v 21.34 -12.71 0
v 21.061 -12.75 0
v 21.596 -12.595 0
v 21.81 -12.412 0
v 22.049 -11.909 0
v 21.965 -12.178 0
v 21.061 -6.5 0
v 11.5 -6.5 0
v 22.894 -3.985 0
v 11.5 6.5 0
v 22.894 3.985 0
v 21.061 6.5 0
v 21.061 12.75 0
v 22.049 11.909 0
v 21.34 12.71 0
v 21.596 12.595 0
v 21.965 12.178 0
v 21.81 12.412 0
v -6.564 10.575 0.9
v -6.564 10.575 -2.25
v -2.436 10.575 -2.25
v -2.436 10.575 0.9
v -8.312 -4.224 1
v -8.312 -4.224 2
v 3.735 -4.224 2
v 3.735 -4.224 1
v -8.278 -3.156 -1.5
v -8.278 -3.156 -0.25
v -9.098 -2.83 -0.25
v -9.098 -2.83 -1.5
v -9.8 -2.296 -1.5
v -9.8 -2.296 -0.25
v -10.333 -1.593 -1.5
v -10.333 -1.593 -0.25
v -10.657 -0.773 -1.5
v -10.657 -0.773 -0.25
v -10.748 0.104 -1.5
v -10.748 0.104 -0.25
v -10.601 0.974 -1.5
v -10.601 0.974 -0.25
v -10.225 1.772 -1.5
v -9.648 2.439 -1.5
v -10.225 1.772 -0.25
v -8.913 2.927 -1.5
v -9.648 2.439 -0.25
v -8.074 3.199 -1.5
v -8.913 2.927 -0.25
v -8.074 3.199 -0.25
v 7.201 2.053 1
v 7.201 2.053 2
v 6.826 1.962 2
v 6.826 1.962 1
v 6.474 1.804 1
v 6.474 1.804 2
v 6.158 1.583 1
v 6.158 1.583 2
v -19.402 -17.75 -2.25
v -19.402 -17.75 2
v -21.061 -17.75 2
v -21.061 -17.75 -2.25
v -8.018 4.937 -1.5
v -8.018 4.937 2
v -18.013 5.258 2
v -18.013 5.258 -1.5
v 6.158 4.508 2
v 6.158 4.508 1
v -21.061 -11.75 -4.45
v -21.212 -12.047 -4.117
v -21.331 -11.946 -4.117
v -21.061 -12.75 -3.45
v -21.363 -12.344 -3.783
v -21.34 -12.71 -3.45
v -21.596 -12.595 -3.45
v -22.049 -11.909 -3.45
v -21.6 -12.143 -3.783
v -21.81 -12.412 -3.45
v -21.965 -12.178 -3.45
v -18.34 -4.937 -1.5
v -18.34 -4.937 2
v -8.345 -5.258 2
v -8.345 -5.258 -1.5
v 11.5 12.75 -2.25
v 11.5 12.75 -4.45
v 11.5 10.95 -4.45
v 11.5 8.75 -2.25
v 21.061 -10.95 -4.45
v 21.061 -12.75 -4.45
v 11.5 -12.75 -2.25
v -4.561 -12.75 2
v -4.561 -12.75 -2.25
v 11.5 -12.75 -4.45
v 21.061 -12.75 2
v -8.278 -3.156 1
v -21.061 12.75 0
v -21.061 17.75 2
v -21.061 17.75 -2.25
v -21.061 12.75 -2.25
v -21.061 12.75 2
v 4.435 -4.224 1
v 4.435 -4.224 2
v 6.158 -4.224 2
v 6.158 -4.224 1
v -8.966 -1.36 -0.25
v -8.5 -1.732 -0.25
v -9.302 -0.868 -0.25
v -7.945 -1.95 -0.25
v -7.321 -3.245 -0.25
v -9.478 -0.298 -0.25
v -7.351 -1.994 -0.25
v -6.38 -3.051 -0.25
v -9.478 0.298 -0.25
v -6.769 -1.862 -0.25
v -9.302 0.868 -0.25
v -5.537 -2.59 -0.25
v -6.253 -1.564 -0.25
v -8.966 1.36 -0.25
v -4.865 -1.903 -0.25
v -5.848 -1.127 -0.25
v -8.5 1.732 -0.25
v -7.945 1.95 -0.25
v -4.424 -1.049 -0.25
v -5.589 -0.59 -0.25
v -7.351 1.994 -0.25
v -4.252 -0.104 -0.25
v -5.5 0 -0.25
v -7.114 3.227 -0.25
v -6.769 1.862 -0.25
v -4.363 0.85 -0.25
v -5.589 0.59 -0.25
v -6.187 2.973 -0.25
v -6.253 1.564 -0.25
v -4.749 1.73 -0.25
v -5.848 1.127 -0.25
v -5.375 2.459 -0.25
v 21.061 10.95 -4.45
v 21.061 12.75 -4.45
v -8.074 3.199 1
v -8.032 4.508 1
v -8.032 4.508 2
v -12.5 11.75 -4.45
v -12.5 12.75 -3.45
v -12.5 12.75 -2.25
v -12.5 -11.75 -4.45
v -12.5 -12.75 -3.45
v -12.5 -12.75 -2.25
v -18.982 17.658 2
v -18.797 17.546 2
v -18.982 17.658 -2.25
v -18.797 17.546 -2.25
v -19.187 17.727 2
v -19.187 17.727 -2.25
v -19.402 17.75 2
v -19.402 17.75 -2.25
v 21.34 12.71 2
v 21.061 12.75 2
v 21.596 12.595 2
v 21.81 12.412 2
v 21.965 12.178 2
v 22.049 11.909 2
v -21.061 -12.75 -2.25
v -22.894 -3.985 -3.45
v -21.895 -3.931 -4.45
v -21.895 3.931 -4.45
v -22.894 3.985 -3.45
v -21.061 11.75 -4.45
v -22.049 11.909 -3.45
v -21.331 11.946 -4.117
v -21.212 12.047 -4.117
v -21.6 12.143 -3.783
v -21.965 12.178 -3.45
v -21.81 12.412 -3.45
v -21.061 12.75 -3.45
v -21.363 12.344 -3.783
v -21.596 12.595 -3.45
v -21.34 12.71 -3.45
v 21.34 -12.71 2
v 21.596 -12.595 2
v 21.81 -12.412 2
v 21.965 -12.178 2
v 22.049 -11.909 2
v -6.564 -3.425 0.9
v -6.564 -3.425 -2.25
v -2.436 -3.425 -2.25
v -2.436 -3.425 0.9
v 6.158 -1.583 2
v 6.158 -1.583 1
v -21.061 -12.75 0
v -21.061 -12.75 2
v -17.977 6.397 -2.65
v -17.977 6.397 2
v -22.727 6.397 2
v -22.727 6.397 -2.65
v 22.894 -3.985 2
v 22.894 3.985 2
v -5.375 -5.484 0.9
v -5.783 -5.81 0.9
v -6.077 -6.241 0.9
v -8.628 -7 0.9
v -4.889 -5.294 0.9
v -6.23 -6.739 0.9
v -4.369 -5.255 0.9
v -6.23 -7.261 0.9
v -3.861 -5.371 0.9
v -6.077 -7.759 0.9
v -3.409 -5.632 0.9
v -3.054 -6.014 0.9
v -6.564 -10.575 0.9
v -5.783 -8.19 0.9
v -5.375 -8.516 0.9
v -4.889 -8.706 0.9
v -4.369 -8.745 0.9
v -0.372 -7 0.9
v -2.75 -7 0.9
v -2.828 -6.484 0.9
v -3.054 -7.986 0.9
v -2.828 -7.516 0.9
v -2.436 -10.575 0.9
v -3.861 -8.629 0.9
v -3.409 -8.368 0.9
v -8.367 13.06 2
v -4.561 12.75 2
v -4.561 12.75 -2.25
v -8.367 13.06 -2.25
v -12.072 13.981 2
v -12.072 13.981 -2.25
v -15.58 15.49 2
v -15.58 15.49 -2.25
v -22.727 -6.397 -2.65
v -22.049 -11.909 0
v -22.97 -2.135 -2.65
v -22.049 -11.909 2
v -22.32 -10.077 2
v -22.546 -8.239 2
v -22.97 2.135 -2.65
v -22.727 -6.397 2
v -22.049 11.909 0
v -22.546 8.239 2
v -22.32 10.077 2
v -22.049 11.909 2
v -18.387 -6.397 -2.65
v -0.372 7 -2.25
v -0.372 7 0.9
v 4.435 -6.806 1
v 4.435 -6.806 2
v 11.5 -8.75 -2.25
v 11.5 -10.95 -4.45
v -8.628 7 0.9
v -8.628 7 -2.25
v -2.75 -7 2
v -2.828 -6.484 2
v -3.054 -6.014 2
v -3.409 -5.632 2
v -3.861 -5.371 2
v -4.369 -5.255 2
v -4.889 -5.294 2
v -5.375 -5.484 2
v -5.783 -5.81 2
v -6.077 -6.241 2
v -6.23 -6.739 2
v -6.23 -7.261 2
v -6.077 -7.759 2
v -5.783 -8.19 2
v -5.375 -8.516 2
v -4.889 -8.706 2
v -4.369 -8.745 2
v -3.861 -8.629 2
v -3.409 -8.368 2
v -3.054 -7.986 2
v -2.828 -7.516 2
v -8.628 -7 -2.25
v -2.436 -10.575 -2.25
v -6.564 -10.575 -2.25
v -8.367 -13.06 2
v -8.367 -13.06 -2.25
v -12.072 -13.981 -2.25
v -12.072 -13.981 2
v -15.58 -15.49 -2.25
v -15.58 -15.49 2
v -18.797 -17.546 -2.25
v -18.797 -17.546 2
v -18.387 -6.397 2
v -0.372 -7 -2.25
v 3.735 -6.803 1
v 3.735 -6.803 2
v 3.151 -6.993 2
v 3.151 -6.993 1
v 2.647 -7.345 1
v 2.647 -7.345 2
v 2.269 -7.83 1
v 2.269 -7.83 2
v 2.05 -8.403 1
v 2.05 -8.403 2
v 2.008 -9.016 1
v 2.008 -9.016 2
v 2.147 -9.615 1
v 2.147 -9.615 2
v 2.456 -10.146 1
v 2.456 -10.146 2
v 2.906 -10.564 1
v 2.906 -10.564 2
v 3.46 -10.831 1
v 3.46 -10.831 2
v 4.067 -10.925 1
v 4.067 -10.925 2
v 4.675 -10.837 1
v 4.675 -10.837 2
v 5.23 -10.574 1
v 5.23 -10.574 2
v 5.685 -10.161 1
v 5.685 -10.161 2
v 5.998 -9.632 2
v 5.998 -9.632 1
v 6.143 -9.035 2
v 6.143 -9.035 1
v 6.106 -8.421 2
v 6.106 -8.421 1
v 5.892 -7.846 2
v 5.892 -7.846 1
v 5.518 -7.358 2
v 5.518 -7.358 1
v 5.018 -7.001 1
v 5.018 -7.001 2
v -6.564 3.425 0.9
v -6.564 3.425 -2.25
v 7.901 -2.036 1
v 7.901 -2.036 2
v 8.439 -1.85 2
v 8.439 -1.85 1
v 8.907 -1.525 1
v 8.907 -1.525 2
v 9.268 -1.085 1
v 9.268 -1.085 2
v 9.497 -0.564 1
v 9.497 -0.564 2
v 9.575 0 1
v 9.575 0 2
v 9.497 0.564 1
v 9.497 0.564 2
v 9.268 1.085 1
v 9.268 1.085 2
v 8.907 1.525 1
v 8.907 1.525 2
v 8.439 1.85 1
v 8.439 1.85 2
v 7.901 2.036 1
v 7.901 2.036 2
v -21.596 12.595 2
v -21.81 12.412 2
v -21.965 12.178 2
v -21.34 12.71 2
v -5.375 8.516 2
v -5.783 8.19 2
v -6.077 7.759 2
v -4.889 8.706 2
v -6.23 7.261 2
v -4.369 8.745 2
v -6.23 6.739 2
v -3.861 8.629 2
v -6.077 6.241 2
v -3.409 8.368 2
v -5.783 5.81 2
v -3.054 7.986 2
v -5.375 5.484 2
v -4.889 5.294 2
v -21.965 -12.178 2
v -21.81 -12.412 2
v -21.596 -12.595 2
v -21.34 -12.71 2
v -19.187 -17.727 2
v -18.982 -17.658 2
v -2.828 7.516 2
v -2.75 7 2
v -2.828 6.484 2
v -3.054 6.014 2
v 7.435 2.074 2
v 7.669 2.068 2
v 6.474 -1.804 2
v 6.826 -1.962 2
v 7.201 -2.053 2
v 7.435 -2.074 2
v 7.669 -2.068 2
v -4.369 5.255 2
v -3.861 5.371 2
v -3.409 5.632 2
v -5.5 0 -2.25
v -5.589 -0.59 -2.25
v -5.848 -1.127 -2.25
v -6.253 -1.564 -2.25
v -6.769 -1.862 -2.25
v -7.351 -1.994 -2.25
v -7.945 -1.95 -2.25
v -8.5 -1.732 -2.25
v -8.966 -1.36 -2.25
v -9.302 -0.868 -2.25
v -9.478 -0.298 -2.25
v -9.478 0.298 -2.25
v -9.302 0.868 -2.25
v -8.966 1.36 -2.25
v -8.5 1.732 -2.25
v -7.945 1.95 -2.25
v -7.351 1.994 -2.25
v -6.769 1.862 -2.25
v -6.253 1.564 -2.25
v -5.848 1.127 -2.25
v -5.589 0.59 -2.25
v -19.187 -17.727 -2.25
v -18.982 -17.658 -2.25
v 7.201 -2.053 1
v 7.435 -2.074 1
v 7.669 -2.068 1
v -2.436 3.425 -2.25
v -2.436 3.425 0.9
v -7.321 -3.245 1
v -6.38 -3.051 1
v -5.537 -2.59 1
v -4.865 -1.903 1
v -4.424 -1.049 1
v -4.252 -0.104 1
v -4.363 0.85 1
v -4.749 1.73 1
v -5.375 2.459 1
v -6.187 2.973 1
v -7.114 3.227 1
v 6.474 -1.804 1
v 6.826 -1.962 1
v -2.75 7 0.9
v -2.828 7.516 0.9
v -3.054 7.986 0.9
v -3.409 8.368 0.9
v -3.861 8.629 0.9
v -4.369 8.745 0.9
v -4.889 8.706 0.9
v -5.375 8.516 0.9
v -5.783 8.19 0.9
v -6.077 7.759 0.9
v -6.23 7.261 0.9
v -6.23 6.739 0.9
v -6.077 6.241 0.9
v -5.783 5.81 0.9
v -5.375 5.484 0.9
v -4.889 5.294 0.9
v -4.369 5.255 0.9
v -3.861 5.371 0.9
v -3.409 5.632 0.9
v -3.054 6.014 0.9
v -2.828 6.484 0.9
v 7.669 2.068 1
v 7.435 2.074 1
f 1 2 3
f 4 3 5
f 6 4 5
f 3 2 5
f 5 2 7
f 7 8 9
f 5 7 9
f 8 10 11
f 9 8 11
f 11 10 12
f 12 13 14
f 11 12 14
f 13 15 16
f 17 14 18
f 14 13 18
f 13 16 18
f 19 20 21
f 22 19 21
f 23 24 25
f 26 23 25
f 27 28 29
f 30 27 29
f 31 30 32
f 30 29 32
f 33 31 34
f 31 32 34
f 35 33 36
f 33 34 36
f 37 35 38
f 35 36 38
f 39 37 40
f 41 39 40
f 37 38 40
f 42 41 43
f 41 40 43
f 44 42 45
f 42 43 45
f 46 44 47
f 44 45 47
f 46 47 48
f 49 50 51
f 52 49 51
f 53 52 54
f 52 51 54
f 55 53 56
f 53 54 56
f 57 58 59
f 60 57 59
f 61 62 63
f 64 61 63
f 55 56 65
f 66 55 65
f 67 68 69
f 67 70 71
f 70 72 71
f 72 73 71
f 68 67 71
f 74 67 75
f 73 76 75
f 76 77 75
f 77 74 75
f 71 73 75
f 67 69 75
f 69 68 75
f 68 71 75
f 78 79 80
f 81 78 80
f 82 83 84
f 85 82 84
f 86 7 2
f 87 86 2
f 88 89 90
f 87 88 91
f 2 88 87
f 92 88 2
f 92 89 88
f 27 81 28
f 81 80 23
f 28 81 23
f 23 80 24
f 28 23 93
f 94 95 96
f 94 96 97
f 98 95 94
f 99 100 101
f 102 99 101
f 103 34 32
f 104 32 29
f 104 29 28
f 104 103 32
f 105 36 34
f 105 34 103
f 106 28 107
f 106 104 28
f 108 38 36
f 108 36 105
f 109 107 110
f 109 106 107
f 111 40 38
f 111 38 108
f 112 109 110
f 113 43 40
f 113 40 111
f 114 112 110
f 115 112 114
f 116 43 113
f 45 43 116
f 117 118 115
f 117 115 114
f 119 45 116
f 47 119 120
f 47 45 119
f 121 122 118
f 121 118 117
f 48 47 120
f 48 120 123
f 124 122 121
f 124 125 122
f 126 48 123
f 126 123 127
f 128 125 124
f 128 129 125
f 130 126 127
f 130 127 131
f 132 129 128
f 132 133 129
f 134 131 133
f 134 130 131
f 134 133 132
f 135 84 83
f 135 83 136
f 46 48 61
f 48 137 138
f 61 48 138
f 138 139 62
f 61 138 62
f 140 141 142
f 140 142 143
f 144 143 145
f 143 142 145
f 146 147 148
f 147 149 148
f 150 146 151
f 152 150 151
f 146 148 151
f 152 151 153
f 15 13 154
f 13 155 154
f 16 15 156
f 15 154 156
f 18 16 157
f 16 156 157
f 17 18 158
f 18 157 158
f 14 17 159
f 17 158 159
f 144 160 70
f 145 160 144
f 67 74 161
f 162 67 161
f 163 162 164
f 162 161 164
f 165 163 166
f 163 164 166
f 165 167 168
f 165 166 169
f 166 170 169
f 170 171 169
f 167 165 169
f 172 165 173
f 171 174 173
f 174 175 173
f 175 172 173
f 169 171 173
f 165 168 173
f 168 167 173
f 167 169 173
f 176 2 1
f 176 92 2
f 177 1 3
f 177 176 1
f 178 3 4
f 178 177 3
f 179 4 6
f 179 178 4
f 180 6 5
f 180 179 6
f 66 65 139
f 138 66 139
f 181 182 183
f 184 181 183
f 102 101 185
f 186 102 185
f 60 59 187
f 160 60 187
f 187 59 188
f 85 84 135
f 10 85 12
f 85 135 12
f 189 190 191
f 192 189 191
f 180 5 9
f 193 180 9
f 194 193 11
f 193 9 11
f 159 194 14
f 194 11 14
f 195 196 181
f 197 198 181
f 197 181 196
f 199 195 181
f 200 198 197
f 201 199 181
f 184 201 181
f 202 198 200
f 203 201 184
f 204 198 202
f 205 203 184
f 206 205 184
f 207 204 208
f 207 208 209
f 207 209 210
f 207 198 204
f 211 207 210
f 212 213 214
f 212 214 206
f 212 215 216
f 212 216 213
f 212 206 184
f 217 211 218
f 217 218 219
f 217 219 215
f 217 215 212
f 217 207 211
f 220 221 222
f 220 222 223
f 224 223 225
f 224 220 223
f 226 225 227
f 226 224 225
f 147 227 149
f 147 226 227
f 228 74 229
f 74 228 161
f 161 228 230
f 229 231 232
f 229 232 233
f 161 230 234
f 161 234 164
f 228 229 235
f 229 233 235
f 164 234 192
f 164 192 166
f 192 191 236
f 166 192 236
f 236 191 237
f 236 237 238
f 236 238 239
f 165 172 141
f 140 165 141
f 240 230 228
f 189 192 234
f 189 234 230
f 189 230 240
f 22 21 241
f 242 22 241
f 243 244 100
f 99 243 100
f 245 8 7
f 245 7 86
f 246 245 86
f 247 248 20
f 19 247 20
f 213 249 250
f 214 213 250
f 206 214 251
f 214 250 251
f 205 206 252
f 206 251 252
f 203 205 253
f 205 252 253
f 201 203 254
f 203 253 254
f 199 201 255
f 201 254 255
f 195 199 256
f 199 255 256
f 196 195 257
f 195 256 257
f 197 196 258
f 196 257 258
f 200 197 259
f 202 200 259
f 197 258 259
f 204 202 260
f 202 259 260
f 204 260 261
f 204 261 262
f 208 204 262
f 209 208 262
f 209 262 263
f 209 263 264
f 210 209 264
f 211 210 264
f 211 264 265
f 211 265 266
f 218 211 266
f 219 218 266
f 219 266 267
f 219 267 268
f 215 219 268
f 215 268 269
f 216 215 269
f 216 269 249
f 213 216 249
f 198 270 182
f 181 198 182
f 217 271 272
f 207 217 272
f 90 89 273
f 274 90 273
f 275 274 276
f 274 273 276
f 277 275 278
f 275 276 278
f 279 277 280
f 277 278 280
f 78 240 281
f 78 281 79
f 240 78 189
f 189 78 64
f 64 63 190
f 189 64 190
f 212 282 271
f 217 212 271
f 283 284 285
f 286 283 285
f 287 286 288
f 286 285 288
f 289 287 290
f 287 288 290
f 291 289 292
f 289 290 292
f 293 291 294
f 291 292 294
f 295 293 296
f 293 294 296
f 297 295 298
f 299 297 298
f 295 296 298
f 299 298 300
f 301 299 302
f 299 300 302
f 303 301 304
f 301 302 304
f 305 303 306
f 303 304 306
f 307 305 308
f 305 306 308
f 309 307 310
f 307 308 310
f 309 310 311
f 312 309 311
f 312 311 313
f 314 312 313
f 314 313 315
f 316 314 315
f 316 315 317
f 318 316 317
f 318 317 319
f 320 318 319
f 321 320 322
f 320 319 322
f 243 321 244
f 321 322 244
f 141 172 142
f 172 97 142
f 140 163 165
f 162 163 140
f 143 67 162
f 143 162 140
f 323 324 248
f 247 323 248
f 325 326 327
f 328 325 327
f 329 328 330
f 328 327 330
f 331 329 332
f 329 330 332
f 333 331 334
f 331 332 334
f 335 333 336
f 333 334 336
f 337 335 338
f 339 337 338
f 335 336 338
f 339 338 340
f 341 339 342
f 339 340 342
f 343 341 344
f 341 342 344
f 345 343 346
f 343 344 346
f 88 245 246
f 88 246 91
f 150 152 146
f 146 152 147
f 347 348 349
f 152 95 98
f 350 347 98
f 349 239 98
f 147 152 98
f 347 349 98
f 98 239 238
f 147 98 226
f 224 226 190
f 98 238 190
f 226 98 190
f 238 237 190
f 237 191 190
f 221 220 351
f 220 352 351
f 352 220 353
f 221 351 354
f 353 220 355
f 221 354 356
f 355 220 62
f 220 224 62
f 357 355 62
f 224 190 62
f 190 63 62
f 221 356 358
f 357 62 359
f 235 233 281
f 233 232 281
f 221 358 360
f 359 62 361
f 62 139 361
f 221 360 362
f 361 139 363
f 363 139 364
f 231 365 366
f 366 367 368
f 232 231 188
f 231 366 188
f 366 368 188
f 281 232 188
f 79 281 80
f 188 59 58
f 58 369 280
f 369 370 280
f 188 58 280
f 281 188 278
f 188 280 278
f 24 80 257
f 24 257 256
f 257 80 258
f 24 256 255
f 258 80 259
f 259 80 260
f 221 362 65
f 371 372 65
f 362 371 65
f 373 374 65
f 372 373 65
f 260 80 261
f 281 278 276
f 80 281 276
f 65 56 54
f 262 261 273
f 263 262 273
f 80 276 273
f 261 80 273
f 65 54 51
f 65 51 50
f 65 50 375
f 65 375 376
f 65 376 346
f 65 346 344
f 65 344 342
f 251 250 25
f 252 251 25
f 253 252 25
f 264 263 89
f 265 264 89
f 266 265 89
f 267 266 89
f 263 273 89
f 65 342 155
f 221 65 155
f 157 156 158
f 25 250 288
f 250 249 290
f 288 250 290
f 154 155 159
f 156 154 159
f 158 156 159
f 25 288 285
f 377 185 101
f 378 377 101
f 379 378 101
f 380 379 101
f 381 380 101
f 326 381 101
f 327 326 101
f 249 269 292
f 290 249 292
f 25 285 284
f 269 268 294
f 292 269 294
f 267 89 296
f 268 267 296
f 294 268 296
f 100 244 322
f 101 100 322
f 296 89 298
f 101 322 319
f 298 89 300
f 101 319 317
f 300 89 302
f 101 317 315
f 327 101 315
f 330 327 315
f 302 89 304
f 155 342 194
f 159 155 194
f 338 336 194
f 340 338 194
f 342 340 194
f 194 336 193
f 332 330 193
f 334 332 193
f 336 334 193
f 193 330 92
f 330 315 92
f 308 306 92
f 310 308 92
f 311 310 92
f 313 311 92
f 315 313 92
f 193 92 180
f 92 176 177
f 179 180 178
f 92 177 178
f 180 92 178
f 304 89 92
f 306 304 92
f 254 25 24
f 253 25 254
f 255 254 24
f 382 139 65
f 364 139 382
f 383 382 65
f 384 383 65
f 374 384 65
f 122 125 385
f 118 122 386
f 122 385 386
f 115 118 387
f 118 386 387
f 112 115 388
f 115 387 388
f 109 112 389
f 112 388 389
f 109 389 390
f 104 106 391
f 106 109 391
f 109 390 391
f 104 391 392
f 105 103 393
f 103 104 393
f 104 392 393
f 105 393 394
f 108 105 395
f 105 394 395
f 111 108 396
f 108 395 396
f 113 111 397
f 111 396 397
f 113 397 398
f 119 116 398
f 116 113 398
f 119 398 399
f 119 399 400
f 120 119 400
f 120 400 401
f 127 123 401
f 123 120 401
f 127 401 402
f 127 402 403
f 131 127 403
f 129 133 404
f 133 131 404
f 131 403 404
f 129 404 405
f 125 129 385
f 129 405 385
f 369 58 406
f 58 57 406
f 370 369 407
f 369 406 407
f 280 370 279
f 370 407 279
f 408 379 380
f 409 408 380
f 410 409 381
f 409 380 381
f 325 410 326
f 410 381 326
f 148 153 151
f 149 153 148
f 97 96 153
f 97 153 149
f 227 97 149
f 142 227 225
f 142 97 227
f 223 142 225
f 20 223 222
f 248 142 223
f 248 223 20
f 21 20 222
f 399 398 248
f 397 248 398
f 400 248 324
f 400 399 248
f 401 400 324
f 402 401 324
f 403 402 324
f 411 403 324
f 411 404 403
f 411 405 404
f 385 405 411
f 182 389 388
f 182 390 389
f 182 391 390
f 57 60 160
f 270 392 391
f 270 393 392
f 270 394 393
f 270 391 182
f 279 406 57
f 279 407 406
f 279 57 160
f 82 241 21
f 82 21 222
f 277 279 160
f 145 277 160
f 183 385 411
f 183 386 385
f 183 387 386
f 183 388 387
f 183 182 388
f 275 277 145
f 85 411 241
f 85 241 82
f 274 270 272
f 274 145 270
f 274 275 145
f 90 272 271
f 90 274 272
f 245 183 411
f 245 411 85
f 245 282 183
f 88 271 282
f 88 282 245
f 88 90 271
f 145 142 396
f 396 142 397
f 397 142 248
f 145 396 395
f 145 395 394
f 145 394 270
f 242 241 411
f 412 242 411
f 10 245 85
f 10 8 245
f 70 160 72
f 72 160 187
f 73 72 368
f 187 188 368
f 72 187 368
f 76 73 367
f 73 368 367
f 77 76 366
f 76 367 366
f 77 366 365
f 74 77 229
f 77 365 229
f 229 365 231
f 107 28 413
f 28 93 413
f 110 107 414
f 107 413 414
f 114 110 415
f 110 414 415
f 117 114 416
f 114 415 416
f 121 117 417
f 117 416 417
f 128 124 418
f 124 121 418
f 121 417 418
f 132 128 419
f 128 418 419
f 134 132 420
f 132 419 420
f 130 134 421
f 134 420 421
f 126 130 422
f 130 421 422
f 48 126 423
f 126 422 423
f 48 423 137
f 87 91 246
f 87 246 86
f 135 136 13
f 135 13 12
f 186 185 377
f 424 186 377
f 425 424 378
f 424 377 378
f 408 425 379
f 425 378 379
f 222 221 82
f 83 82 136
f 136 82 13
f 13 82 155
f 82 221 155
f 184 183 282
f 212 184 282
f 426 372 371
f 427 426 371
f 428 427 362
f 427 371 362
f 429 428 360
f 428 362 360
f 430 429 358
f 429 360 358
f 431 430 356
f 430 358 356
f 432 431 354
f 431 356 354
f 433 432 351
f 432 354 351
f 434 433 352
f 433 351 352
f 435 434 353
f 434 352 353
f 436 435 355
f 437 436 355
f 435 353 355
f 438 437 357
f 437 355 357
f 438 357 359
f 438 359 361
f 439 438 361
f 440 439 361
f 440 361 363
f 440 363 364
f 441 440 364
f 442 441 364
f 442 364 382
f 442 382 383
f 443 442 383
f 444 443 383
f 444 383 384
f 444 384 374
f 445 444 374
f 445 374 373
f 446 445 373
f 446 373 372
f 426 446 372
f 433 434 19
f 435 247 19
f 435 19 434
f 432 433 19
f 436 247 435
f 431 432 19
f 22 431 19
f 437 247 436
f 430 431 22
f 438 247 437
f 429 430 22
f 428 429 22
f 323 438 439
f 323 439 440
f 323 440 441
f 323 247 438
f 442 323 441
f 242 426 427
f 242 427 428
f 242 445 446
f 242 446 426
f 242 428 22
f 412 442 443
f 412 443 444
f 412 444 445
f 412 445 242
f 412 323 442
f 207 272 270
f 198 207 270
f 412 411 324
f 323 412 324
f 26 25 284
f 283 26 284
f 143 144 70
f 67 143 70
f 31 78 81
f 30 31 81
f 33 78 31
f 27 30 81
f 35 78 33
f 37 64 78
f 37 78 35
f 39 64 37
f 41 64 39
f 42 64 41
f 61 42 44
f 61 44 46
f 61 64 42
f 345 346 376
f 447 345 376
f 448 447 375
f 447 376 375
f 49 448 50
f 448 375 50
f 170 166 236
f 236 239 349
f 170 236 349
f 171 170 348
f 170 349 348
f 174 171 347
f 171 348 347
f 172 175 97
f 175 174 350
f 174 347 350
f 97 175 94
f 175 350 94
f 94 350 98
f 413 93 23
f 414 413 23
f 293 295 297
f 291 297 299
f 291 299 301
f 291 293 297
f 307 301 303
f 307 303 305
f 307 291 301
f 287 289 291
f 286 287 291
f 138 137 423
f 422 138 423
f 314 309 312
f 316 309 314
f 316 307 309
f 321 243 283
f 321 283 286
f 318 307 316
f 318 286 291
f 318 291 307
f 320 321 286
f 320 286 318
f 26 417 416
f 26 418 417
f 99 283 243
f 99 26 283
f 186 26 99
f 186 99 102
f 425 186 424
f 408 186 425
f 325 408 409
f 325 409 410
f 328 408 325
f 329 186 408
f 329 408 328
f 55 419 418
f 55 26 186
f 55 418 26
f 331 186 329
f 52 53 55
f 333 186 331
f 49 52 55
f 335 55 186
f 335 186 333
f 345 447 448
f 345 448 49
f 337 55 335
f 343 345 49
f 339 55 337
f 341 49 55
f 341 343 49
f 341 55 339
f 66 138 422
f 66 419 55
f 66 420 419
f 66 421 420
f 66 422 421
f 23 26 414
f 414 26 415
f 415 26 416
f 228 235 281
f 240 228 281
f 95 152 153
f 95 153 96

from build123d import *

# Parameters (mm, degrees)
F1_DEPTH     = 2
F2_R         = 1
F4_DEPTH     = 2.25
F6_DEPTH     = 2.2
F7_R         = 2
F8_DEPTH     = 25
F9_R         = 3.25
F9_R_2       = 2
F10_DEPTH    = 2.25
F12_DEPTH    = 4.65
F14_DEPTH    = 3.5
F16_DEPTH    = 1
F17_R        = 1.75
F18_DEPTH    = 25
F20_DEPTH    = 3.15
F21_W        = 9.561190108
F21_H        = 6.25
F22_DEPTH    = 4.45
F23_T4_DEPTH = 21.0051794045
F23_T9_DEPTH = 21.0051794045
F24_SIZE     = 1
F26_DEPTH    = 4.25
F27_R        = 1


# Not quite as in the source:
# - a fillet or chamfer that OpenCascade refuses, or shapes differently, is made with other operations: its cross-section is extruded or revolved along the edge and cut away or added
# - a pattern or mirror of a feature is missing from the dataset's text; its kind, count and spacing are read off the source's solid


with BuildPart() as f1:
    # F0 (on Top) → F1 (new body)
    with BuildSketch(Plane.XY):
        with BuildLine():
            Line((21.9083046755, 12.75), (-21.9083046755, 12.75))
            ThreePointArc((-21.9083046755, 12.75), (-23, 0), (-21.9083046755, -12.75))
            Line((-21.9083046755, -12.75), (21.9083046755, -12.75))
            ThreePointArc((21.9083046755, -12.75), (23, 0), (21.9083046755, 12.75))
        make_face()
    extrude(amount=F1_DEPTH)

    # F2
    f2_edges = [f1.edges().sort_by_distance(p)[0] for p in [
        (-21.908305, 12.75, 1),
        (21.908305, 12.75, 1),
        (-21.908305, -12.75, 1),
        (21.908305, -12.75, 1),
    ]]
    fillet(f2_edges, radius=F2_R)

    # F3 (on face) → F4 (join)
    with BuildSketch(Plane(origin=(0, 0, 0), x_dir=(1, 0, 0), z_dir=(0, 0, -1))):
        with BuildLine():
            Line((11.5, 12.75), (-21.061190108, 12.75))
            ThreePointArc((-21.061190108, 12.75), (-21.7097331737, 12.5111779634), (-22.0485034879, 11.9087837838))
            ThreePointArc((-22.0485034879, 11.9087837838), (-23, 0), (-22.0485034879, -11.9087837838))
            ThreePointArc((-22.0485034879, -11.9087837838), (-21.7097331737, -12.5111779634), (-21.061190108, -12.75))
            Line((-21.061190108, -12.75), (11.5, -12.75))
            Line((11.5, -12.75), (11.5, 12.75))
        make_face()
    extrude(amount=F4_DEPTH)

    # F5 (on face) → F6 (join)
    with BuildSketch(Plane(origin=(0, 0, -2.25), x_dir=(1, 0, 0), z_dir=(0, 0, -1))):
        with BuildLine():
            ThreePointArc((-22.0485034879, -11.9087837838), (-21.7097331737, -12.5111779634), (-21.061190108, -12.75))
            Line((-21.061190108, -12.75), (-12.5, -12.75))
            Line((-12.5, -12.75), (-12.5, 12.75))
            Line((-12.5, 12.75), (-21.061190108, 12.75))
            ThreePointArc((-21.061190108, 12.75), (-21.7097331737, 12.5111779634), (-22.0485034879, 11.9087837838))
            ThreePointArc((-22.0485034879, 11.9087837838), (-23, 0), (-22.0485034879, -11.9087837838))
        make_face()
    extrude(amount=F6_DEPTH)

    # F7 (on face) → F8 (cut)
    with BuildSketch(Plane(origin=(0, 0, -2.25), x_dir=(1, 0, 0), z_dir=(0, 0, -1))):
        with Locations((-7.5, 0)):
            Circle(F7_R)
    extrude(amount=-F8_DEPTH, mode=Mode.SUBTRACT)

    # F9 (on face) → F10 (cut)
    with BuildSketch(Plane.XY.offset(2)):
        with Locations((-7.5, 0)):
            Circle(F9_R)
        with Locations((-7.5, 0)):
            Circle(F9_R_2, mode=Mode.SUBTRACT)
    extrude(amount=-F10_DEPTH, mode=Mode.SUBTRACT)

    # F11 (on face) → F12 (cut)
    with BuildSketch(Plane.XY.offset(2)):
        Polygon((-17.9767161827, 6.3967091968), (-22.7267161827, 6.3967091968), (-22.7267161827, -6.3967091968), (-18.3871376794, -6.3967091968), align=None)
        with BuildLine():
            ThreePointArc((-22.7267161827, -6.3967091968), (-23, 0), (-22.7267161827, 6.3967091968))
            Line((-22.7267161827, 6.3967091968), (-24.9030976, 6.3967091968))
            Line((-24.9030976, 6.3967091968), (-24.9030976, -6.3967091968))
            Line((-24.9030976, -6.3967091968), (-23.1371376794, -6.3967091968))
            Line((-23.1371376794, -6.3967091968), (-22.7267161827, -6.3967091968))
        make_face()
        Polygon((-22.7267161827, -6.3967091968), (-22.7267161827, 6.3967091968), (-24.9030976, 6.3967091968), (-24.9030976, -6.3967091968), (-23.1371376794, -6.3967091968), align=None)
    extrude(amount=-F12_DEPTH, mode=Mode.SUBTRACT)

    # F13 (on face) → F14 (cut)
    with BuildSketch(Plane.XY.offset(2)):
        with BuildLine():
            Line((-8.0183982933, 4.9370567441), (-18.0132564134, 5.2576985384))
            Line((-18.0132564134, 5.2576985384), (-18.3403110436, -4.9370567441))
            Line((-18.3403110436, -4.9370567441), (-8.3454529235, -5.2576985384))
            Line((-8.3454529235, -5.2576985384), (-8.2780130541, -3.1555024462))
            ThreePointArc((-8.2780130541, -3.1555024462), (-10.748328889, 0.1042085831), (-8.074160142, 3.1988810749))
            Line((-8.074160142, 3.1988810749), (-8.0183982933, 4.9370567441))
        make_face()
    extrude(amount=-F14_DEPTH, mode=Mode.SUBTRACT)

    # F15 (on face) → F16 (cut)
    with BuildSketch(Plane.XY.offset(2)):
        with BuildLine():
            ThreePointArc((7.2010516835, -2.053352114), (7.5517942695, -2.0743534785), (7.9010516835, -2.0358739026))
            ThreePointArc((7.9010516835, -2.0358739026), (9.575, 0), (7.9010516835, 2.0358739026))
            ThreePointArc((7.9010516835, 2.0358739026), (7.5517942695, 2.0743534785), (7.2010516835, 2.053352114))
            ThreePointArc((7.2010516835, 2.053352114), (6.646380727, 1.8912850491), (6.1579127796, 1.5825381173))
            Line((6.1579127796, 1.5825381173), (6.1579127796, 4.5080841794))
            Line((6.1579127796, 4.5080841794), (-8.312298453, 4.5080841794))
            Line((-8.312298453, 4.5080841794), (-8.312298453, -4.22422681))
            Line((-8.312298453, -4.22422681), (3.735084728, -4.22422681))
            Line((3.735084728, -4.22422681), (3.735084728, -6.8032004514))
            ThreePointArc((3.735084728, -6.8032004514), (4.0668227554, -10.9249796186), (4.435084728, -6.8063030421))
            Line((4.435084728, -6.8063030421), (4.435084728, -4.22422681))
            Line((4.435084728, -4.22422681), (6.1579127796, -4.22422681))
            Line((6.1579127796, -4.22422681), (6.1579127796, -1.5825381173))
            ThreePointArc((6.1579127796, -1.5825381173), (6.646380727, -1.8912850491), (7.2010516835, -2.053352114))
        make_face()
    extrude(amount=-F16_DEPTH, mode=Mode.SUBTRACT)

    # F17 (on face) → F18 (cut)
    with BuildSketch(Plane.XY.offset(2)):
        with Locations((-4.5, 7)):
            Circle(F17_R)
        with Locations((-4.5, -7)):
            Circle(F17_R)
    extrude(amount=-F18_DEPTH, mode=Mode.SUBTRACT)

    # F19 (on face) → F20 (cut)
    with BuildSketch(Plane(origin=(0, 0, -2.25), x_dir=(1, 0, 0), z_dir=(0, 0, -1))):
        Polygon((-2.4359727876, 10.575), (-6.5640272124, 10.575), (-8.6280544247, 7), (-6.5640272124, 3.425), (-2.4359727876, 3.425), (-0.3719455753, 7), align=None)
        Polygon((-2.4359727876, -3.425), (-6.5640272124, -3.425), (-8.6280544247, -7), (-6.5640272124, -10.575), (-2.4359727876, -10.575), (-0.3719455753, -7), align=None)
    extrude(amount=-F20_DEPTH, mode=Mode.SUBTRACT)

    # F21 (on face) → F22 (join, through all)
    with BuildSketch(Plane(origin=(0, 0, 0), x_dir=(1, 0, 0), z_dir=(0, 0, -1))):
        with Locations((16.280595054, 9.625)):
            Rectangle(F21_W, F21_H)
        with Locations((16.280595054, -9.625)):
            Rectangle(F21_W, F21_H)
    extrude(amount=F22_DEPTH)

    # F23: chamfer of 4.45 on 2 edges, made by hand


with BuildPart() as f23_tool2:
    # F23_s3 → F23_t4 (new body)
    with BuildSketch(Plane.YZ.offset(11.5)):
        Polygon((-6.5, 0), (-10.95, -4.45), (-6.5, -4.45), align=None)
    extrude(amount=F23_T4_DEPTH)

    split(bisect_by=Plane.XY, keep=Keep.BOTTOM)


with BuildPart() as f1_1:
    add(f1.part)

    # F23_t1: cut F23_tool2
    add(f23_tool2.part, mode=Mode.SUBTRACT)


with BuildPart() as f23_tool7:
    # F23_s8 → F23_t9 (new body)
    with BuildSketch(Plane.YZ.offset(32.5051794045)):
        Polygon((10.95, -4.45), (6.5, 0), (6.5, -4.45), align=None)
    extrude(amount=-F23_T9_DEPTH)

    split(bisect_by=Plane.XY, keep=Keep.BOTTOM)


with BuildPart() as f1_2:
    add(f1_1.part)

    # F23_t6: cut F23_tool7
    add(f23_tool7.part, mode=Mode.SUBTRACT)

    # F24
    f24_edges = [f1_2.edges().sort_by_distance(p)[0] for p in [
        (-16.780595, -12.75, -4.45),
        (-16.780595, 12.75, -4.45),
        (-21.709733, -12.511178, -4.45),
        (-23, 0, -4.45),
        (-21.709733, 12.511178, -4.45),
    ]]
    chamfer(f24_edges, length=F24_SIZE)

    # F25 (on face) → F26 (join, through all)
    with BuildSketch(Plane.XY.offset(2)):
        with BuildLine():
            Line((-21.061190108, 17.75), (-21.061190108, 12.75))
            Line((-21.061190108, 12.75), (-4.561190108, 12.75))
            ThreePointArc((-4.561190108, 12.75), (-12.2301209331, 14.0351006072), (-19.061190108, 17.75))
            Line((-19.061190108, 17.75), (-21.061190108, 17.75))
        make_face()
    f26 = extrude(amount=-F26_DEPTH)

    # F26_copies: F26 across plane
    add(f26.mirror(Plane(origin=(0, 0, 0), x_dir=(0, 0, -1), z_dir=(0, -1, 0))))

    # F27
    f27_edges = [f1_2.edges().sort_by_distance(p)[0] for p in [
        (-19.06119, 17.75, -0.125),
        (-19.06119, -17.75, -0.125),
    ]]
    fillet(f27_edges, radius=F27_R)


solid = f1_2.part
